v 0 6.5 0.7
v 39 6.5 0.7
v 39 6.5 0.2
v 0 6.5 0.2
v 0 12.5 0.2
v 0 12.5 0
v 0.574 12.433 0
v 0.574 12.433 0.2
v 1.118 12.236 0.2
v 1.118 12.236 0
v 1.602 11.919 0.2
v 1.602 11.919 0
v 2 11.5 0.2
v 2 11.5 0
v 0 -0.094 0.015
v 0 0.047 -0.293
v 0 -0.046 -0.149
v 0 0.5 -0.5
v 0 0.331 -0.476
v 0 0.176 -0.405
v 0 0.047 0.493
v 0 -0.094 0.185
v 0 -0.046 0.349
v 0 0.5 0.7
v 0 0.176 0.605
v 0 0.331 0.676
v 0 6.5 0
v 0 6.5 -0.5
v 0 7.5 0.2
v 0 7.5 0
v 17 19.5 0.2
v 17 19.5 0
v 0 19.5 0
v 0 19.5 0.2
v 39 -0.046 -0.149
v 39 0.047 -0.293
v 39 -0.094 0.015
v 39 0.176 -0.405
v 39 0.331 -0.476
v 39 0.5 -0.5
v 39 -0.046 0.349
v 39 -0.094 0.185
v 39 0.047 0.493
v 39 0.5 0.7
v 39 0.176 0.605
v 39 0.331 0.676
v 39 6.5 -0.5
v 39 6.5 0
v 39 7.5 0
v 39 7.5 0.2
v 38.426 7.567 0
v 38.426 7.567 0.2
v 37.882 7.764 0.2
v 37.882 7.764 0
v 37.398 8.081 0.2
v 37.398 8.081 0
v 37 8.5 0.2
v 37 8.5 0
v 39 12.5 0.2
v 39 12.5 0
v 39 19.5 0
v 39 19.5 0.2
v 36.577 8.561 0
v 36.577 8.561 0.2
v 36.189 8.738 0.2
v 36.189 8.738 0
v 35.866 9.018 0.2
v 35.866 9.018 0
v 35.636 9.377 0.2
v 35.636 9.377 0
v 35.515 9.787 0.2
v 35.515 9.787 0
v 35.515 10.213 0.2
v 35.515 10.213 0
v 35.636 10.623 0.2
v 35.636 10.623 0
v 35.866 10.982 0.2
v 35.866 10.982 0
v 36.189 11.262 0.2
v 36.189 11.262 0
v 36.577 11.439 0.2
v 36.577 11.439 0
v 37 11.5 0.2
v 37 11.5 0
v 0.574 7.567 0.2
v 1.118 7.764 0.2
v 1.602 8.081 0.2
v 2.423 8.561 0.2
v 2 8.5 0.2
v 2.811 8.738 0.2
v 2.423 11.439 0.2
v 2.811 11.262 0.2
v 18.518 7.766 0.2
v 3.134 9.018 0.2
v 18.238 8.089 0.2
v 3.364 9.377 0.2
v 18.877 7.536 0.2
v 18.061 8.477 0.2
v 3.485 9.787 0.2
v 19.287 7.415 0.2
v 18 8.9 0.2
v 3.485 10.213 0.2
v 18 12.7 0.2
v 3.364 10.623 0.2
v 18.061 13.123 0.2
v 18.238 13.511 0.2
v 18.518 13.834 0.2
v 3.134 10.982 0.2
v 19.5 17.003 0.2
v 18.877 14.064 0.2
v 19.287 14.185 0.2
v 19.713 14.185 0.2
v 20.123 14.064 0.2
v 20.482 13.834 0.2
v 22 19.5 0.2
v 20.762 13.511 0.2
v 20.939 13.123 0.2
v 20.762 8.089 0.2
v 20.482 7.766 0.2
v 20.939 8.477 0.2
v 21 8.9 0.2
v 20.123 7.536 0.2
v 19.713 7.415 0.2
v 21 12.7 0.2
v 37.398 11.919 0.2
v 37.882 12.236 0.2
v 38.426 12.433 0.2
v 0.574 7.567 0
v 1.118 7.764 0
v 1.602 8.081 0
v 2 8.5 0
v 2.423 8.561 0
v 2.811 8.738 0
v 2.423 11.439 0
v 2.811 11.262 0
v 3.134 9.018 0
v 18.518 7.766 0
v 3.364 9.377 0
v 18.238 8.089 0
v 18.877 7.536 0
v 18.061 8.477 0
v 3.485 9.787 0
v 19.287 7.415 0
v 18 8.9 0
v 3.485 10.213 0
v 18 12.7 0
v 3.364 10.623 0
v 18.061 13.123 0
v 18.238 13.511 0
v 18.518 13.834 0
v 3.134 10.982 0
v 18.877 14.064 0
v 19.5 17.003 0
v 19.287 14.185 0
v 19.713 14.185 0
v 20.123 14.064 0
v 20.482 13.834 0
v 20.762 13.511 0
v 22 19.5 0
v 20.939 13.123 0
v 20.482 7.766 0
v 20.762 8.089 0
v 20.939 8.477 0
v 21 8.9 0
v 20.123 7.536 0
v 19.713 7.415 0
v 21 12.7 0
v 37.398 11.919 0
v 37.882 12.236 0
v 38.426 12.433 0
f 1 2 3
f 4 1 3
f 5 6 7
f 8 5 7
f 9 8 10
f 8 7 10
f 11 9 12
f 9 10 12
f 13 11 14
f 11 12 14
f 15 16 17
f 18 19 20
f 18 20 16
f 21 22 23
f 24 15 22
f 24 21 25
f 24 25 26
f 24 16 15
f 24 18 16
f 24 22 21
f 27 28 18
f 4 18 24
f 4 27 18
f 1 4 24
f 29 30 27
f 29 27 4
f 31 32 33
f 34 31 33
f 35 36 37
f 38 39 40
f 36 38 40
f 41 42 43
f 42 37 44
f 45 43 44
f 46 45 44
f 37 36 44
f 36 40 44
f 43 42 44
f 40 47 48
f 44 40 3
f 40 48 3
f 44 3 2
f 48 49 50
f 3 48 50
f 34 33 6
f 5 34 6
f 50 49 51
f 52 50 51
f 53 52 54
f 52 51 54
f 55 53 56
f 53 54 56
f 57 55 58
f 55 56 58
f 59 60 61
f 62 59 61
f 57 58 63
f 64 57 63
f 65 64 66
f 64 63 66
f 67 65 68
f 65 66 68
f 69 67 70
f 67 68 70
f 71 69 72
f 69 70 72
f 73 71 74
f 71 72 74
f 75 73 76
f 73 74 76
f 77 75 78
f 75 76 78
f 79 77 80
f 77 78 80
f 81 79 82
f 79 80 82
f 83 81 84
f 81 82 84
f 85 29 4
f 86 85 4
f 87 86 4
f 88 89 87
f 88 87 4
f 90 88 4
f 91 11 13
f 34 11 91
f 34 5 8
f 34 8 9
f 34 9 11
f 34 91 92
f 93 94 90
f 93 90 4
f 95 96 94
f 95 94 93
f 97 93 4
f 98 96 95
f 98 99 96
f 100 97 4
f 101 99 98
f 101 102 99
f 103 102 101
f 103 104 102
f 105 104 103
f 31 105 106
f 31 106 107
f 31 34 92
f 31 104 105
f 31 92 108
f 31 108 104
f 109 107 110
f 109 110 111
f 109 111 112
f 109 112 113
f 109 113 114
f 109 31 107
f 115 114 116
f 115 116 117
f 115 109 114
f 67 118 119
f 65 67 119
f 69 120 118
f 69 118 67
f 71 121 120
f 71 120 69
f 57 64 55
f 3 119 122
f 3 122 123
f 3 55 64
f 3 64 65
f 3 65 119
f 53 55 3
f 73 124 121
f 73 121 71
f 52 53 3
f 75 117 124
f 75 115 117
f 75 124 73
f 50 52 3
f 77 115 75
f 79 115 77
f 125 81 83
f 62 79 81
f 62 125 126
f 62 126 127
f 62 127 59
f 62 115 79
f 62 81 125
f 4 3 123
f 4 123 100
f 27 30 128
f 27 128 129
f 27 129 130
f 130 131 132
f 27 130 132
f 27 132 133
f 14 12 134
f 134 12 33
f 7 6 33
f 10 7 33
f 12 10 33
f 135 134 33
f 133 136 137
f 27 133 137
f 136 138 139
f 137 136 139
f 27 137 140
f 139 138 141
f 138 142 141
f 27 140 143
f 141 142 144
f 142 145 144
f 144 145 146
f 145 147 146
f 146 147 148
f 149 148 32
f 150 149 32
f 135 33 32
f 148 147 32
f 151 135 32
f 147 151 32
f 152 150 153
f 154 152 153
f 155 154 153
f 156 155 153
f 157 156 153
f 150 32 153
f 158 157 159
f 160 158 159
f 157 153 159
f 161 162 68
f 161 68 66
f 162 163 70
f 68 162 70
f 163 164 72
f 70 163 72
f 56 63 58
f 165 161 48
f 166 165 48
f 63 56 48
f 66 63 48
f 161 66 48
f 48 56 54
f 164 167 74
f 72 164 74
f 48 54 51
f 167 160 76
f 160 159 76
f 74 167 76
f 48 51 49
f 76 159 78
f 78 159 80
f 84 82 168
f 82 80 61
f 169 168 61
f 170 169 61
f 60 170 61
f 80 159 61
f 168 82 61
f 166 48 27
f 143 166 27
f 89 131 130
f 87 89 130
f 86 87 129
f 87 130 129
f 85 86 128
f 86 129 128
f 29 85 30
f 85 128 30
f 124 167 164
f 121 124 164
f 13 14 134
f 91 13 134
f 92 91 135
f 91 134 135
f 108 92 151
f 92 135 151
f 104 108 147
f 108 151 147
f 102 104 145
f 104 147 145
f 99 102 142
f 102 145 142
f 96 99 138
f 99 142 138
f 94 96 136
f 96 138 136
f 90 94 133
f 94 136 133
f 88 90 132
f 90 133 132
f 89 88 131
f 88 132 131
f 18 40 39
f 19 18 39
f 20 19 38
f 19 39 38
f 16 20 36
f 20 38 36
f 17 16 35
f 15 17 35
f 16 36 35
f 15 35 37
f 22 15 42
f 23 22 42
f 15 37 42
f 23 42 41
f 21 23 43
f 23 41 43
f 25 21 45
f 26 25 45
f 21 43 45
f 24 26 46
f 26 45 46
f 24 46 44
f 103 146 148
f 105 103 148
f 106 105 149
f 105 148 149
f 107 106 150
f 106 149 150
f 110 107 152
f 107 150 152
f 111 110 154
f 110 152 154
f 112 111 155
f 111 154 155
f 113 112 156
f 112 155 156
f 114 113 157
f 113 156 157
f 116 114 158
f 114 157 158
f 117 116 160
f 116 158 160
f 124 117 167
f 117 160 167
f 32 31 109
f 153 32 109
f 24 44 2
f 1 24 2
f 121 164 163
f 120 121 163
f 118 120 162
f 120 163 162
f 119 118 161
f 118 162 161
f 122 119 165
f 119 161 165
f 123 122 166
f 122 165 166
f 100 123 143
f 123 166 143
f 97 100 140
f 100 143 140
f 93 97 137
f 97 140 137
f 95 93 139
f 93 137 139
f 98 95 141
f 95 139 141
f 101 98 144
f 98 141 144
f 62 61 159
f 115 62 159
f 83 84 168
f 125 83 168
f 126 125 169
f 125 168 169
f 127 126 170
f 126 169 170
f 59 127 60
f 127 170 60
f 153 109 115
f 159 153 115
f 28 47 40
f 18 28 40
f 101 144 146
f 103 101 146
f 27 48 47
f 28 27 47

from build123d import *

# Parameters (mm, degrees)
BOSS_EXTRUDE1_DEPTH = 0.2
BOSS_EXTRUDE2_DEPTH = 39
CUT_EXTRUDE1_DEPTH  = 10


with BuildPart() as part:
    # Sketch1 → Boss-Extrude1 (new body)
    with BuildSketch(Plane.XY):
        with BuildLine():
            Line((0, 0), (39, 0))
            Line((39, 0), (39, 7.5))
            ThreePointArc((39, 7.5), (37.881966011, 7.763932023), (37, 8.5))
            ThreePointArc((37, 8.5), (35.5, 10), (37, 11.5))
            ThreePointArc((37, 11.5), (37.881966011, 12.236067977), (39, 12.5))
            Line((39, 12.5), (39, 19.5))
            Line((39, 19.5), (0, 19.5))
            Line((0, 19.5), (0, 12.5))
            ThreePointArc((0, 12.5), (1.118033989, 12.236067977), (2, 11.5))
            ThreePointArc((2, 11.5), (3.5, 10), (2, 8.5))
            ThreePointArc((2, 8.5), (1.118033989, 7.763932023), (0, 7.5))
            Line((0, 7.5), (0, 0))
        make_face()
        with BuildLine():
            Line((21, 12.7), (21, 8.9))
            ThreePointArc((21, 8.9), (19.5, 7.4), (18, 8.9))
            Line((18, 8.9), (18, 12.7))
            ThreePointArc((18, 12.7), (19.5, 14.2), (21, 12.7))
        make_face(mode=Mode.SUBTRACT)
    extrude(amount=BOSS_EXTRUDE1_DEPTH)

    # Sketch2 → Boss-Extrude2 (add)
    with BuildSketch(Plane(origin=(39, 0, 0), x_dir=(0, 0, -1), z_dir=(1, 0, 0))):
        with BuildLine():
            Line((-0.7, 0.5), (-0.7, 6.5))
            Line((-0.7, 6.5), (-0.2, 6.5))
            Line((-0.2, 6.5), (-0.2, 0))
            Line((-0.2, 0), (0, 0))
            Line((0, 0), (0, 6.5))
            Line((0, 6.5), (0.5, 6.5))
            Line((0.5, 6.5), (0.5, 0.5))
            ThreePointArc((0.5, 0.5), (-0.1, -0.1), (-0.7, 0.5))
        make_face()
    extrude(amount=-BOSS_EXTRUDE2_DEPTH)

    # Sketch3 → Cut-Extrude1 (cut)
    with BuildSketch(Plane.XY.offset(0.2)):
        Polygon((17, 19.5), (19.5, 17.002927863), (22, 19.5), (22, 22.539691699), (17, 22.539691699), align=None)
    extrude(amount=-CUT_EXTRUDE1_DEPTH, mode=Mode.SUBTRACT)


solid = part.part
